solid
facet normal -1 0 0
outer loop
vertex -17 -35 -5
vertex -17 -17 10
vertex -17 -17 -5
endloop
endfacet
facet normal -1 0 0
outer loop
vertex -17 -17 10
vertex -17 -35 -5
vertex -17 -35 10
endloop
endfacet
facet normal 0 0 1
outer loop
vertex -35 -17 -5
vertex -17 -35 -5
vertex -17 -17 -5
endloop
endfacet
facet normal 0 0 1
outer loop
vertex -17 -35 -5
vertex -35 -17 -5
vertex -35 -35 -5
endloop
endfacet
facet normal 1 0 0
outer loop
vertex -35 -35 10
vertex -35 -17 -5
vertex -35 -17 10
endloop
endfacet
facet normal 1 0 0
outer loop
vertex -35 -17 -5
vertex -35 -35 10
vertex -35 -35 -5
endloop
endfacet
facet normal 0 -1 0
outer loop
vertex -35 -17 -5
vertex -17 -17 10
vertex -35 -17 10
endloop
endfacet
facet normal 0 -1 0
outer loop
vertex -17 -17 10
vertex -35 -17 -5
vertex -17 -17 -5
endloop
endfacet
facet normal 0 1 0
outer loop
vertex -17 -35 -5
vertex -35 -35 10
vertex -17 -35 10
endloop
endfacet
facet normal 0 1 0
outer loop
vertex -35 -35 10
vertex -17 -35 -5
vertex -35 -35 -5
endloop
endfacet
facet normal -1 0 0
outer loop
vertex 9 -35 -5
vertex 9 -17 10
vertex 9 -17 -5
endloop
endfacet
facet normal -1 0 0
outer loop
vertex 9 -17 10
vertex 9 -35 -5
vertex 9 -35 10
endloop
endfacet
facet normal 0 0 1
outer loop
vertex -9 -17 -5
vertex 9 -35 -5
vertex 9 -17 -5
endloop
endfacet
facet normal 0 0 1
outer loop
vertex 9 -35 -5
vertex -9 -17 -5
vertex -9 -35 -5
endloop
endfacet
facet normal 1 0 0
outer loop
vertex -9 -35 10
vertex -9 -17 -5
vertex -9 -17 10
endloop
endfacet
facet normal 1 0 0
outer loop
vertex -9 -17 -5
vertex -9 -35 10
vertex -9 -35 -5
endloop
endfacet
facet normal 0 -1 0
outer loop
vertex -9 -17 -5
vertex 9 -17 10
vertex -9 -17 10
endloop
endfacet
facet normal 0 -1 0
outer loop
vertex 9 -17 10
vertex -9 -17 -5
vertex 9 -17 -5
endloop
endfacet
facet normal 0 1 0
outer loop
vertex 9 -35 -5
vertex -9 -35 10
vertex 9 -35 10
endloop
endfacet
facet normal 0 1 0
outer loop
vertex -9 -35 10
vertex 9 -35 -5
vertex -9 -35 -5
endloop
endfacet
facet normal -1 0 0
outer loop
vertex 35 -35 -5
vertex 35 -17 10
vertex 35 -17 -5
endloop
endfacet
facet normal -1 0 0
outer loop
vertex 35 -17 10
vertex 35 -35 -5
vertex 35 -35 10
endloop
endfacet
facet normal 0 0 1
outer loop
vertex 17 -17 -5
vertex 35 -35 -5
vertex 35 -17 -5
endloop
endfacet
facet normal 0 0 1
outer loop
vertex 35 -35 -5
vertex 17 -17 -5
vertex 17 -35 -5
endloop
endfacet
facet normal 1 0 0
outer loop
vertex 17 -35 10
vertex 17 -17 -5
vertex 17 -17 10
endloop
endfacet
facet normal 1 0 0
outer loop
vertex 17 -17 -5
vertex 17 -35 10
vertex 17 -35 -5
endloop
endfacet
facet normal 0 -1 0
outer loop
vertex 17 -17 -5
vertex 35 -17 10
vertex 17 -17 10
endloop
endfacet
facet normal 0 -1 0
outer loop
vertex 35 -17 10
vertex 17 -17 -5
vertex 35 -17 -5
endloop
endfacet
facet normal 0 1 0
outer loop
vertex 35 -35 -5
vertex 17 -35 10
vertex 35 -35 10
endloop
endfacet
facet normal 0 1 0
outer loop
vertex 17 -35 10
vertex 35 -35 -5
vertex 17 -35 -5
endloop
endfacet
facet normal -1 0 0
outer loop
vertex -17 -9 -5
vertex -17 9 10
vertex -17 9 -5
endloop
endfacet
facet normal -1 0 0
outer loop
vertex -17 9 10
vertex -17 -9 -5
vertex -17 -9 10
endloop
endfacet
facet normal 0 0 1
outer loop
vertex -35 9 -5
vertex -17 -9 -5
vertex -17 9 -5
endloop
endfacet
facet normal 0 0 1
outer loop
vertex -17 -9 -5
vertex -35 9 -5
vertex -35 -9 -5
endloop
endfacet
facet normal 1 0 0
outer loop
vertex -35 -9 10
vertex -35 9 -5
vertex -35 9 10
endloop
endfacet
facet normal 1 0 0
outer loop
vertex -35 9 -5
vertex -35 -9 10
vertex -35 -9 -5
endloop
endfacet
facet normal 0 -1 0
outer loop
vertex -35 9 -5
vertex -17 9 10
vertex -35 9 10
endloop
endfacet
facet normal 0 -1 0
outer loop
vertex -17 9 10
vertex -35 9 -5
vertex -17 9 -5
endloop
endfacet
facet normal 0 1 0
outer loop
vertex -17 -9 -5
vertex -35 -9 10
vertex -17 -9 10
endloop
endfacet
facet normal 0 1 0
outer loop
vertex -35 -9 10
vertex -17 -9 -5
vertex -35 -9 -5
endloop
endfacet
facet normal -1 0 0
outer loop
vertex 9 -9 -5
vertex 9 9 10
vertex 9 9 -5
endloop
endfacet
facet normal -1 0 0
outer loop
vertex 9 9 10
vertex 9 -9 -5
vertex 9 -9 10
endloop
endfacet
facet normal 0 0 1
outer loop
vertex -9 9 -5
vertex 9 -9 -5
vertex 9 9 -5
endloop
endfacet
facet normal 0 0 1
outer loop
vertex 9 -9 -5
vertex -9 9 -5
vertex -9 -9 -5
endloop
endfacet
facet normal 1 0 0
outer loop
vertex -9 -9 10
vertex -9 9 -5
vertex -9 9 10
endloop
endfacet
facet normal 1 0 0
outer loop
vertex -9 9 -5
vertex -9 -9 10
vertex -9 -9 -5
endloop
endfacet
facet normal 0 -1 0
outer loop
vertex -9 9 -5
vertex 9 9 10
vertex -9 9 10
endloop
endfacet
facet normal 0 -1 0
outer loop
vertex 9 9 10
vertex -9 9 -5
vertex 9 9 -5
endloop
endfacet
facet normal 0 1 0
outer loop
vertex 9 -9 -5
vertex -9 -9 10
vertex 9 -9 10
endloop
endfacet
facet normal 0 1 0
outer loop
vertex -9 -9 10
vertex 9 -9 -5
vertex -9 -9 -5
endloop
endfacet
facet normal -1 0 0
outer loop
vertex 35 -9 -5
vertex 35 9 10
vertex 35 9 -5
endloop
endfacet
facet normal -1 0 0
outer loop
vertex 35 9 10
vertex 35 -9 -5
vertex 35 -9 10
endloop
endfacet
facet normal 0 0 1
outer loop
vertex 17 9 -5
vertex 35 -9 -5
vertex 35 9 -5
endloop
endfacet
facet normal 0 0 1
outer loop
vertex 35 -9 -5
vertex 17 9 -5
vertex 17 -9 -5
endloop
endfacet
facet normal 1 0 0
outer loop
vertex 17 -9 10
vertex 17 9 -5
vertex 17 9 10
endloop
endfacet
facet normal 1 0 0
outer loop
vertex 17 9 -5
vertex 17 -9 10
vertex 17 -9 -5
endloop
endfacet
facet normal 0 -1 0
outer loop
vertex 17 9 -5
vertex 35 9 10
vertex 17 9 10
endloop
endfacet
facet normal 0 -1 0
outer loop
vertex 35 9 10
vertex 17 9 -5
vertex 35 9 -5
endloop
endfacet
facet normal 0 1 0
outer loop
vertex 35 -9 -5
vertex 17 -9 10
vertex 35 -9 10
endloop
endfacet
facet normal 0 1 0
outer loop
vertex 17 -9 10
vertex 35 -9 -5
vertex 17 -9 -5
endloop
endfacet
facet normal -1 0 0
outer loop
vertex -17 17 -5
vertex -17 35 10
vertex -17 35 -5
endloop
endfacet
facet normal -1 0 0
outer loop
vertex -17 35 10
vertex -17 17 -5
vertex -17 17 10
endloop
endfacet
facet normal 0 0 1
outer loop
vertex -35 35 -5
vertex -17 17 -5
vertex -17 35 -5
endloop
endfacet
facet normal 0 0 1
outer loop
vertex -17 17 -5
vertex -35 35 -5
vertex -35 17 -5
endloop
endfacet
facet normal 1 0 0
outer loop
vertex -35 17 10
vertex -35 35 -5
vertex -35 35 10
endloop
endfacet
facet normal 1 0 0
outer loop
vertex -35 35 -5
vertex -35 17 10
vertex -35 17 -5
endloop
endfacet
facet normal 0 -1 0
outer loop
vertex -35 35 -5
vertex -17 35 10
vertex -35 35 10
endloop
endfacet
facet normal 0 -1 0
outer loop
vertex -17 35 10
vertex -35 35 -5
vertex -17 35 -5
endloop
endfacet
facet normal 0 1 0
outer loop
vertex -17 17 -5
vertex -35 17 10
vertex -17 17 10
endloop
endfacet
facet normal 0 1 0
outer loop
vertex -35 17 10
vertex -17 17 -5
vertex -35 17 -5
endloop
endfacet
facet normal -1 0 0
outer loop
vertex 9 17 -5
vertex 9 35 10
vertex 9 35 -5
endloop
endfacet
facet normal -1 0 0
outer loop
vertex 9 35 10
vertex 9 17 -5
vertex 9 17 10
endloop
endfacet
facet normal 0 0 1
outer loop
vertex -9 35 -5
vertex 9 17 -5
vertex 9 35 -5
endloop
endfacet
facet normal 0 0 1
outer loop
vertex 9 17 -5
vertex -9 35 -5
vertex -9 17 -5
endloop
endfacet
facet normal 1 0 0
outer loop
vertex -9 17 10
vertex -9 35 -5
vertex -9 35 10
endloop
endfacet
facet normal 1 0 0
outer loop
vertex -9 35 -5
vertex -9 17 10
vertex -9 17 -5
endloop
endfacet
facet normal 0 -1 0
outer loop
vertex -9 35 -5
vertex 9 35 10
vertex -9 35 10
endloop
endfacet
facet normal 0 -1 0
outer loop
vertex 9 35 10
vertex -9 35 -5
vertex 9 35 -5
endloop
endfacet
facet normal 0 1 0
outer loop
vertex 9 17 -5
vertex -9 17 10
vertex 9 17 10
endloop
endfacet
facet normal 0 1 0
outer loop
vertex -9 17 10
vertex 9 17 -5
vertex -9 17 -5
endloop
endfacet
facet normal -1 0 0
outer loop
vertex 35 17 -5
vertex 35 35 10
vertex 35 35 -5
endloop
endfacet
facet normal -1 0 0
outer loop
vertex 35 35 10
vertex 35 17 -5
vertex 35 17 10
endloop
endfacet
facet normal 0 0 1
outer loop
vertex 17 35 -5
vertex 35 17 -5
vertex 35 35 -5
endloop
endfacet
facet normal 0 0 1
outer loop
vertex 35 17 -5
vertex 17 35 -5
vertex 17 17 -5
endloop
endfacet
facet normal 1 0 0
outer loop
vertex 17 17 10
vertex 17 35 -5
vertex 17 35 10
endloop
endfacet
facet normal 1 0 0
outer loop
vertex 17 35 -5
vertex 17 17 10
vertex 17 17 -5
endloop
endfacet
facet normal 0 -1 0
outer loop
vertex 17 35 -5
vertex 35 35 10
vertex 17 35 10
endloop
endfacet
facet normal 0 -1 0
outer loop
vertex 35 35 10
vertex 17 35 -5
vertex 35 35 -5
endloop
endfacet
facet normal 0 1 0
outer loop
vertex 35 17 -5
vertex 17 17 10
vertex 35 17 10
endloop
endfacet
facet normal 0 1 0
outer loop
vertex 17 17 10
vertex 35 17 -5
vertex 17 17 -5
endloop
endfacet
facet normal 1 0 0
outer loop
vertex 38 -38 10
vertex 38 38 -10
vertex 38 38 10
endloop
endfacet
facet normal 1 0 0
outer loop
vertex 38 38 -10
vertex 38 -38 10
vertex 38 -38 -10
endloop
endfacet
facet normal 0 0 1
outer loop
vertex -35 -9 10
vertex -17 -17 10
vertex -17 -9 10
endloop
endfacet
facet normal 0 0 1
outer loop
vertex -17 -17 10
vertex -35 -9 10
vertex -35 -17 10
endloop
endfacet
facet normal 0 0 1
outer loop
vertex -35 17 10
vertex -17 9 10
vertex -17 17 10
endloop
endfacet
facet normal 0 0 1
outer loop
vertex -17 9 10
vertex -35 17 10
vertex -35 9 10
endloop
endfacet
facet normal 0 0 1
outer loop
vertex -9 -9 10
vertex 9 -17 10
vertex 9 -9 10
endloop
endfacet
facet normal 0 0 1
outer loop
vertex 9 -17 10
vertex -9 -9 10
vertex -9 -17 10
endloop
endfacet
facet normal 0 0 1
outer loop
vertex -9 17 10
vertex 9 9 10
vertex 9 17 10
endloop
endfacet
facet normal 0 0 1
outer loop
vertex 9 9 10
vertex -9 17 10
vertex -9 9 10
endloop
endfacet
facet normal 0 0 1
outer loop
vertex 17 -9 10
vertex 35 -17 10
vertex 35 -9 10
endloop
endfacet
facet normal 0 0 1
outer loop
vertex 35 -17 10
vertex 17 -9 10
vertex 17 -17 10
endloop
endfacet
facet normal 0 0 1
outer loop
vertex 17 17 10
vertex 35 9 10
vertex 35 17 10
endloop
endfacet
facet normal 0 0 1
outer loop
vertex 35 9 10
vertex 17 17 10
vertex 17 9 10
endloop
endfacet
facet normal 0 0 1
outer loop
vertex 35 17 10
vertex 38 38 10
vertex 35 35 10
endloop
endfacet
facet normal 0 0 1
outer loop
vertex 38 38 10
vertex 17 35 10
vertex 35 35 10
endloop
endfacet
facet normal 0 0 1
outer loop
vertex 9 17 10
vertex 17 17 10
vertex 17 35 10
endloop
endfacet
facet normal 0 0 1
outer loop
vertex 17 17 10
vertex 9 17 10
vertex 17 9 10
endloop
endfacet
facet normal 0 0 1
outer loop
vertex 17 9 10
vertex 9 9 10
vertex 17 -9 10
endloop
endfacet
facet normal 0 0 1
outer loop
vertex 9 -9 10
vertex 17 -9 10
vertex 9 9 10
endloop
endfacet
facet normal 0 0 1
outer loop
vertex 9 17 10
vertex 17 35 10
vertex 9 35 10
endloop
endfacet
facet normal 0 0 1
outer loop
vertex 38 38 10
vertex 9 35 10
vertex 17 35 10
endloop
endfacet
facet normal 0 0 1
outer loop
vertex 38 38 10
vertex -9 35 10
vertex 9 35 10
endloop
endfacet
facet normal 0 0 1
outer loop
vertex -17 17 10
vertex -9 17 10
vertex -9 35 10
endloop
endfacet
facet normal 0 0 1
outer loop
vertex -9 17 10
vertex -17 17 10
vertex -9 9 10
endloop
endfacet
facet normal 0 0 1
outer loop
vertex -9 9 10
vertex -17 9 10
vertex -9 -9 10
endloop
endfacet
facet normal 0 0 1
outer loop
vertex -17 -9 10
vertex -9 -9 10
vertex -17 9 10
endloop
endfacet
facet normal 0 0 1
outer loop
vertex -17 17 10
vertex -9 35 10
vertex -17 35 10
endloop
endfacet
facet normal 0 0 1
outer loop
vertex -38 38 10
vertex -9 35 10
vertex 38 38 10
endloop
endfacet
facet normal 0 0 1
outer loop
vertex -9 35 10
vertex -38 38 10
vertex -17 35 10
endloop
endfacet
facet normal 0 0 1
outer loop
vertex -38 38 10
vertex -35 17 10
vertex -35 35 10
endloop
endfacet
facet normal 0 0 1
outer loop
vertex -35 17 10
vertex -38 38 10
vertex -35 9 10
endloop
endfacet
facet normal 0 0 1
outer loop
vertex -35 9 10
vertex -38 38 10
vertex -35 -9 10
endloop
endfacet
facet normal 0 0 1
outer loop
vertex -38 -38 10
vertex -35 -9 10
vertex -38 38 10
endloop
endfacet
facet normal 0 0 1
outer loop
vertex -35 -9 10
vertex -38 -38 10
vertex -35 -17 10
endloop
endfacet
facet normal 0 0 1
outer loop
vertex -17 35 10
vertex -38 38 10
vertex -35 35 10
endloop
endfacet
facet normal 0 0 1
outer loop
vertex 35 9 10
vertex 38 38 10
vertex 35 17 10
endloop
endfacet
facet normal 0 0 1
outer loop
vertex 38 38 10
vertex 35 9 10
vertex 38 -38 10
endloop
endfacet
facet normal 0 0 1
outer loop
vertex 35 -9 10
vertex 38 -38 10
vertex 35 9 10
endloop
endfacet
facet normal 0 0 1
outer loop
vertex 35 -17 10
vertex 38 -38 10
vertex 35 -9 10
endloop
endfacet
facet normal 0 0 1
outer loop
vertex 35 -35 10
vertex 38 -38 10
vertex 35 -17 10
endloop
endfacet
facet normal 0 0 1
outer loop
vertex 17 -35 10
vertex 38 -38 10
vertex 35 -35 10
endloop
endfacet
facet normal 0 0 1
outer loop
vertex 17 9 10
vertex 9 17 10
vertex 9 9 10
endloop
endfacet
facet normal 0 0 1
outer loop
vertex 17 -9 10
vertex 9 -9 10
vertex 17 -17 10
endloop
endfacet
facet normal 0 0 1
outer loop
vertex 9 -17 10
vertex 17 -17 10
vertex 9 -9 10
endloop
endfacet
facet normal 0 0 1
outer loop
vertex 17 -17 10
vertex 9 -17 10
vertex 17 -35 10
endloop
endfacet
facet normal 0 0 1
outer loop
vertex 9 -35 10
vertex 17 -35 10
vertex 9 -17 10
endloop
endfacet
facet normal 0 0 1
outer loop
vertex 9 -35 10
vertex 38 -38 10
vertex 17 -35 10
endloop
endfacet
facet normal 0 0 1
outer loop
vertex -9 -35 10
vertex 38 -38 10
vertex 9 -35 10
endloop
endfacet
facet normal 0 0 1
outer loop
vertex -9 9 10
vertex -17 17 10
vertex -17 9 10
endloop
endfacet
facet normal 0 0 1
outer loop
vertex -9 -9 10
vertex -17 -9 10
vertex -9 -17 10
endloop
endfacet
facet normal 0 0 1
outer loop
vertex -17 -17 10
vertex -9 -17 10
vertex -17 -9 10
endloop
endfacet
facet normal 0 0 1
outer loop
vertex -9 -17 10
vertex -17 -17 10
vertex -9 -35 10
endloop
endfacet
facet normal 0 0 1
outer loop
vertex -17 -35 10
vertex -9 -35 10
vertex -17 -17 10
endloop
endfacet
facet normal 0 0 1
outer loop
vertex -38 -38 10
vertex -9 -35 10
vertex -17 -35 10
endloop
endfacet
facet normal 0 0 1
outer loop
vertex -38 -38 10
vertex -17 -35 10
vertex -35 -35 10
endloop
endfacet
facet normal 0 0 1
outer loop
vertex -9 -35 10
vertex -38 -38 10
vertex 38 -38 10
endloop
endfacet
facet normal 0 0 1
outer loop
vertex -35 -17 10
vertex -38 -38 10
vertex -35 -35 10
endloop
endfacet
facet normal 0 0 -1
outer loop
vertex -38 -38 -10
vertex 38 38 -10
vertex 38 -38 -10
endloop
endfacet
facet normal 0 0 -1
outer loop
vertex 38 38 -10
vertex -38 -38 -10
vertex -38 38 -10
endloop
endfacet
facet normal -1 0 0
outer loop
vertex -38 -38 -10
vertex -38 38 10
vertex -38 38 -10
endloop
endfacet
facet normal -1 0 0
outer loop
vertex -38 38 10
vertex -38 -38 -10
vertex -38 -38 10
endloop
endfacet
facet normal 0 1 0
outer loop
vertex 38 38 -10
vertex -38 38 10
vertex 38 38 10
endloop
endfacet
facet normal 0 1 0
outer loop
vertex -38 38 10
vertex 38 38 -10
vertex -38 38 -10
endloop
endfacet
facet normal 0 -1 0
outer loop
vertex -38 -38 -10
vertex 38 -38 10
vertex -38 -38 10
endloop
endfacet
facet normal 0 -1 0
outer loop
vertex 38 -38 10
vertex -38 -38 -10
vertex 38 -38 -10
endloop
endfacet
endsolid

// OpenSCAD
$fn = 32;

// ----------------------------------------------------------------------
// Pocket plate 76 x 76 x 20
// 3 x 3 pockets 18 mm square, 15 mm deep
// ----------------------------------------------------------------------

// --- parameters (mm) ---
thickness = 20;  // plate thickness
floor_t = 5;     // material left under each pocket
pocket = 18;     // pocket side length
pitch_x = 26;    // pocket pitch along X
pitch_y = 26;    // pocket pitch along Y
cols = 3;        // pockets per row
rows = 3;        // rows of pockets

// --- derived feature positions (mm) ---
depth = thickness - floor_t;        // = 15   pocket depth, down to the floor
span_x = (cols - 1) * pitch_x;      // = 52   distance between outer pockets
span_y = (rows - 1) * pitch_y;      // = 52   distance between outer pocket rows
origin_x = -span_x / 2;             // = -26   X of the first pocket
origin_y = -span_y / 2;             // = -26   Y of the first pocket
plate = [span_x + pocket + 6, span_y + pocket + 6, thickness];  // = [76, 76, 20]   overall size: pockets plus 3 mm of wall on each side
feature_centers = [
  [origin_x + 0 * pitch_x, origin_y + 0 * pitch_y],
  [origin_x + 1 * pitch_x, origin_y + 0 * pitch_y],
  [origin_x + 2 * pitch_x, origin_y + 0 * pitch_y],
  [origin_x + 0 * pitch_x, origin_y + 1 * pitch_y],
  [origin_x + 1 * pitch_x, origin_y + 1 * pitch_y],
  [origin_x + 2 * pitch_x, origin_y + 1 * pitch_y],
  [origin_x + 0 * pitch_x, origin_y + 2 * pitch_y],
  [origin_x + 1 * pitch_x, origin_y + 2 * pitch_y],
  [origin_x + 2 * pitch_x, origin_y + 2 * pitch_y]
];   // pocket centres, used verbatim by the cutter loop

// plate outline, then one pocket per centre in feature_centers
difference() {
  cube(plate, center = true);
  for (centre = feature_centers)
    translate([centre[0] - pocket / 2, centre[1] - pocket / 2, plate[2] / 2 - depth])
      cube([pocket, pocket, depth + 1]);  // centred on the declared pocket centre
}
